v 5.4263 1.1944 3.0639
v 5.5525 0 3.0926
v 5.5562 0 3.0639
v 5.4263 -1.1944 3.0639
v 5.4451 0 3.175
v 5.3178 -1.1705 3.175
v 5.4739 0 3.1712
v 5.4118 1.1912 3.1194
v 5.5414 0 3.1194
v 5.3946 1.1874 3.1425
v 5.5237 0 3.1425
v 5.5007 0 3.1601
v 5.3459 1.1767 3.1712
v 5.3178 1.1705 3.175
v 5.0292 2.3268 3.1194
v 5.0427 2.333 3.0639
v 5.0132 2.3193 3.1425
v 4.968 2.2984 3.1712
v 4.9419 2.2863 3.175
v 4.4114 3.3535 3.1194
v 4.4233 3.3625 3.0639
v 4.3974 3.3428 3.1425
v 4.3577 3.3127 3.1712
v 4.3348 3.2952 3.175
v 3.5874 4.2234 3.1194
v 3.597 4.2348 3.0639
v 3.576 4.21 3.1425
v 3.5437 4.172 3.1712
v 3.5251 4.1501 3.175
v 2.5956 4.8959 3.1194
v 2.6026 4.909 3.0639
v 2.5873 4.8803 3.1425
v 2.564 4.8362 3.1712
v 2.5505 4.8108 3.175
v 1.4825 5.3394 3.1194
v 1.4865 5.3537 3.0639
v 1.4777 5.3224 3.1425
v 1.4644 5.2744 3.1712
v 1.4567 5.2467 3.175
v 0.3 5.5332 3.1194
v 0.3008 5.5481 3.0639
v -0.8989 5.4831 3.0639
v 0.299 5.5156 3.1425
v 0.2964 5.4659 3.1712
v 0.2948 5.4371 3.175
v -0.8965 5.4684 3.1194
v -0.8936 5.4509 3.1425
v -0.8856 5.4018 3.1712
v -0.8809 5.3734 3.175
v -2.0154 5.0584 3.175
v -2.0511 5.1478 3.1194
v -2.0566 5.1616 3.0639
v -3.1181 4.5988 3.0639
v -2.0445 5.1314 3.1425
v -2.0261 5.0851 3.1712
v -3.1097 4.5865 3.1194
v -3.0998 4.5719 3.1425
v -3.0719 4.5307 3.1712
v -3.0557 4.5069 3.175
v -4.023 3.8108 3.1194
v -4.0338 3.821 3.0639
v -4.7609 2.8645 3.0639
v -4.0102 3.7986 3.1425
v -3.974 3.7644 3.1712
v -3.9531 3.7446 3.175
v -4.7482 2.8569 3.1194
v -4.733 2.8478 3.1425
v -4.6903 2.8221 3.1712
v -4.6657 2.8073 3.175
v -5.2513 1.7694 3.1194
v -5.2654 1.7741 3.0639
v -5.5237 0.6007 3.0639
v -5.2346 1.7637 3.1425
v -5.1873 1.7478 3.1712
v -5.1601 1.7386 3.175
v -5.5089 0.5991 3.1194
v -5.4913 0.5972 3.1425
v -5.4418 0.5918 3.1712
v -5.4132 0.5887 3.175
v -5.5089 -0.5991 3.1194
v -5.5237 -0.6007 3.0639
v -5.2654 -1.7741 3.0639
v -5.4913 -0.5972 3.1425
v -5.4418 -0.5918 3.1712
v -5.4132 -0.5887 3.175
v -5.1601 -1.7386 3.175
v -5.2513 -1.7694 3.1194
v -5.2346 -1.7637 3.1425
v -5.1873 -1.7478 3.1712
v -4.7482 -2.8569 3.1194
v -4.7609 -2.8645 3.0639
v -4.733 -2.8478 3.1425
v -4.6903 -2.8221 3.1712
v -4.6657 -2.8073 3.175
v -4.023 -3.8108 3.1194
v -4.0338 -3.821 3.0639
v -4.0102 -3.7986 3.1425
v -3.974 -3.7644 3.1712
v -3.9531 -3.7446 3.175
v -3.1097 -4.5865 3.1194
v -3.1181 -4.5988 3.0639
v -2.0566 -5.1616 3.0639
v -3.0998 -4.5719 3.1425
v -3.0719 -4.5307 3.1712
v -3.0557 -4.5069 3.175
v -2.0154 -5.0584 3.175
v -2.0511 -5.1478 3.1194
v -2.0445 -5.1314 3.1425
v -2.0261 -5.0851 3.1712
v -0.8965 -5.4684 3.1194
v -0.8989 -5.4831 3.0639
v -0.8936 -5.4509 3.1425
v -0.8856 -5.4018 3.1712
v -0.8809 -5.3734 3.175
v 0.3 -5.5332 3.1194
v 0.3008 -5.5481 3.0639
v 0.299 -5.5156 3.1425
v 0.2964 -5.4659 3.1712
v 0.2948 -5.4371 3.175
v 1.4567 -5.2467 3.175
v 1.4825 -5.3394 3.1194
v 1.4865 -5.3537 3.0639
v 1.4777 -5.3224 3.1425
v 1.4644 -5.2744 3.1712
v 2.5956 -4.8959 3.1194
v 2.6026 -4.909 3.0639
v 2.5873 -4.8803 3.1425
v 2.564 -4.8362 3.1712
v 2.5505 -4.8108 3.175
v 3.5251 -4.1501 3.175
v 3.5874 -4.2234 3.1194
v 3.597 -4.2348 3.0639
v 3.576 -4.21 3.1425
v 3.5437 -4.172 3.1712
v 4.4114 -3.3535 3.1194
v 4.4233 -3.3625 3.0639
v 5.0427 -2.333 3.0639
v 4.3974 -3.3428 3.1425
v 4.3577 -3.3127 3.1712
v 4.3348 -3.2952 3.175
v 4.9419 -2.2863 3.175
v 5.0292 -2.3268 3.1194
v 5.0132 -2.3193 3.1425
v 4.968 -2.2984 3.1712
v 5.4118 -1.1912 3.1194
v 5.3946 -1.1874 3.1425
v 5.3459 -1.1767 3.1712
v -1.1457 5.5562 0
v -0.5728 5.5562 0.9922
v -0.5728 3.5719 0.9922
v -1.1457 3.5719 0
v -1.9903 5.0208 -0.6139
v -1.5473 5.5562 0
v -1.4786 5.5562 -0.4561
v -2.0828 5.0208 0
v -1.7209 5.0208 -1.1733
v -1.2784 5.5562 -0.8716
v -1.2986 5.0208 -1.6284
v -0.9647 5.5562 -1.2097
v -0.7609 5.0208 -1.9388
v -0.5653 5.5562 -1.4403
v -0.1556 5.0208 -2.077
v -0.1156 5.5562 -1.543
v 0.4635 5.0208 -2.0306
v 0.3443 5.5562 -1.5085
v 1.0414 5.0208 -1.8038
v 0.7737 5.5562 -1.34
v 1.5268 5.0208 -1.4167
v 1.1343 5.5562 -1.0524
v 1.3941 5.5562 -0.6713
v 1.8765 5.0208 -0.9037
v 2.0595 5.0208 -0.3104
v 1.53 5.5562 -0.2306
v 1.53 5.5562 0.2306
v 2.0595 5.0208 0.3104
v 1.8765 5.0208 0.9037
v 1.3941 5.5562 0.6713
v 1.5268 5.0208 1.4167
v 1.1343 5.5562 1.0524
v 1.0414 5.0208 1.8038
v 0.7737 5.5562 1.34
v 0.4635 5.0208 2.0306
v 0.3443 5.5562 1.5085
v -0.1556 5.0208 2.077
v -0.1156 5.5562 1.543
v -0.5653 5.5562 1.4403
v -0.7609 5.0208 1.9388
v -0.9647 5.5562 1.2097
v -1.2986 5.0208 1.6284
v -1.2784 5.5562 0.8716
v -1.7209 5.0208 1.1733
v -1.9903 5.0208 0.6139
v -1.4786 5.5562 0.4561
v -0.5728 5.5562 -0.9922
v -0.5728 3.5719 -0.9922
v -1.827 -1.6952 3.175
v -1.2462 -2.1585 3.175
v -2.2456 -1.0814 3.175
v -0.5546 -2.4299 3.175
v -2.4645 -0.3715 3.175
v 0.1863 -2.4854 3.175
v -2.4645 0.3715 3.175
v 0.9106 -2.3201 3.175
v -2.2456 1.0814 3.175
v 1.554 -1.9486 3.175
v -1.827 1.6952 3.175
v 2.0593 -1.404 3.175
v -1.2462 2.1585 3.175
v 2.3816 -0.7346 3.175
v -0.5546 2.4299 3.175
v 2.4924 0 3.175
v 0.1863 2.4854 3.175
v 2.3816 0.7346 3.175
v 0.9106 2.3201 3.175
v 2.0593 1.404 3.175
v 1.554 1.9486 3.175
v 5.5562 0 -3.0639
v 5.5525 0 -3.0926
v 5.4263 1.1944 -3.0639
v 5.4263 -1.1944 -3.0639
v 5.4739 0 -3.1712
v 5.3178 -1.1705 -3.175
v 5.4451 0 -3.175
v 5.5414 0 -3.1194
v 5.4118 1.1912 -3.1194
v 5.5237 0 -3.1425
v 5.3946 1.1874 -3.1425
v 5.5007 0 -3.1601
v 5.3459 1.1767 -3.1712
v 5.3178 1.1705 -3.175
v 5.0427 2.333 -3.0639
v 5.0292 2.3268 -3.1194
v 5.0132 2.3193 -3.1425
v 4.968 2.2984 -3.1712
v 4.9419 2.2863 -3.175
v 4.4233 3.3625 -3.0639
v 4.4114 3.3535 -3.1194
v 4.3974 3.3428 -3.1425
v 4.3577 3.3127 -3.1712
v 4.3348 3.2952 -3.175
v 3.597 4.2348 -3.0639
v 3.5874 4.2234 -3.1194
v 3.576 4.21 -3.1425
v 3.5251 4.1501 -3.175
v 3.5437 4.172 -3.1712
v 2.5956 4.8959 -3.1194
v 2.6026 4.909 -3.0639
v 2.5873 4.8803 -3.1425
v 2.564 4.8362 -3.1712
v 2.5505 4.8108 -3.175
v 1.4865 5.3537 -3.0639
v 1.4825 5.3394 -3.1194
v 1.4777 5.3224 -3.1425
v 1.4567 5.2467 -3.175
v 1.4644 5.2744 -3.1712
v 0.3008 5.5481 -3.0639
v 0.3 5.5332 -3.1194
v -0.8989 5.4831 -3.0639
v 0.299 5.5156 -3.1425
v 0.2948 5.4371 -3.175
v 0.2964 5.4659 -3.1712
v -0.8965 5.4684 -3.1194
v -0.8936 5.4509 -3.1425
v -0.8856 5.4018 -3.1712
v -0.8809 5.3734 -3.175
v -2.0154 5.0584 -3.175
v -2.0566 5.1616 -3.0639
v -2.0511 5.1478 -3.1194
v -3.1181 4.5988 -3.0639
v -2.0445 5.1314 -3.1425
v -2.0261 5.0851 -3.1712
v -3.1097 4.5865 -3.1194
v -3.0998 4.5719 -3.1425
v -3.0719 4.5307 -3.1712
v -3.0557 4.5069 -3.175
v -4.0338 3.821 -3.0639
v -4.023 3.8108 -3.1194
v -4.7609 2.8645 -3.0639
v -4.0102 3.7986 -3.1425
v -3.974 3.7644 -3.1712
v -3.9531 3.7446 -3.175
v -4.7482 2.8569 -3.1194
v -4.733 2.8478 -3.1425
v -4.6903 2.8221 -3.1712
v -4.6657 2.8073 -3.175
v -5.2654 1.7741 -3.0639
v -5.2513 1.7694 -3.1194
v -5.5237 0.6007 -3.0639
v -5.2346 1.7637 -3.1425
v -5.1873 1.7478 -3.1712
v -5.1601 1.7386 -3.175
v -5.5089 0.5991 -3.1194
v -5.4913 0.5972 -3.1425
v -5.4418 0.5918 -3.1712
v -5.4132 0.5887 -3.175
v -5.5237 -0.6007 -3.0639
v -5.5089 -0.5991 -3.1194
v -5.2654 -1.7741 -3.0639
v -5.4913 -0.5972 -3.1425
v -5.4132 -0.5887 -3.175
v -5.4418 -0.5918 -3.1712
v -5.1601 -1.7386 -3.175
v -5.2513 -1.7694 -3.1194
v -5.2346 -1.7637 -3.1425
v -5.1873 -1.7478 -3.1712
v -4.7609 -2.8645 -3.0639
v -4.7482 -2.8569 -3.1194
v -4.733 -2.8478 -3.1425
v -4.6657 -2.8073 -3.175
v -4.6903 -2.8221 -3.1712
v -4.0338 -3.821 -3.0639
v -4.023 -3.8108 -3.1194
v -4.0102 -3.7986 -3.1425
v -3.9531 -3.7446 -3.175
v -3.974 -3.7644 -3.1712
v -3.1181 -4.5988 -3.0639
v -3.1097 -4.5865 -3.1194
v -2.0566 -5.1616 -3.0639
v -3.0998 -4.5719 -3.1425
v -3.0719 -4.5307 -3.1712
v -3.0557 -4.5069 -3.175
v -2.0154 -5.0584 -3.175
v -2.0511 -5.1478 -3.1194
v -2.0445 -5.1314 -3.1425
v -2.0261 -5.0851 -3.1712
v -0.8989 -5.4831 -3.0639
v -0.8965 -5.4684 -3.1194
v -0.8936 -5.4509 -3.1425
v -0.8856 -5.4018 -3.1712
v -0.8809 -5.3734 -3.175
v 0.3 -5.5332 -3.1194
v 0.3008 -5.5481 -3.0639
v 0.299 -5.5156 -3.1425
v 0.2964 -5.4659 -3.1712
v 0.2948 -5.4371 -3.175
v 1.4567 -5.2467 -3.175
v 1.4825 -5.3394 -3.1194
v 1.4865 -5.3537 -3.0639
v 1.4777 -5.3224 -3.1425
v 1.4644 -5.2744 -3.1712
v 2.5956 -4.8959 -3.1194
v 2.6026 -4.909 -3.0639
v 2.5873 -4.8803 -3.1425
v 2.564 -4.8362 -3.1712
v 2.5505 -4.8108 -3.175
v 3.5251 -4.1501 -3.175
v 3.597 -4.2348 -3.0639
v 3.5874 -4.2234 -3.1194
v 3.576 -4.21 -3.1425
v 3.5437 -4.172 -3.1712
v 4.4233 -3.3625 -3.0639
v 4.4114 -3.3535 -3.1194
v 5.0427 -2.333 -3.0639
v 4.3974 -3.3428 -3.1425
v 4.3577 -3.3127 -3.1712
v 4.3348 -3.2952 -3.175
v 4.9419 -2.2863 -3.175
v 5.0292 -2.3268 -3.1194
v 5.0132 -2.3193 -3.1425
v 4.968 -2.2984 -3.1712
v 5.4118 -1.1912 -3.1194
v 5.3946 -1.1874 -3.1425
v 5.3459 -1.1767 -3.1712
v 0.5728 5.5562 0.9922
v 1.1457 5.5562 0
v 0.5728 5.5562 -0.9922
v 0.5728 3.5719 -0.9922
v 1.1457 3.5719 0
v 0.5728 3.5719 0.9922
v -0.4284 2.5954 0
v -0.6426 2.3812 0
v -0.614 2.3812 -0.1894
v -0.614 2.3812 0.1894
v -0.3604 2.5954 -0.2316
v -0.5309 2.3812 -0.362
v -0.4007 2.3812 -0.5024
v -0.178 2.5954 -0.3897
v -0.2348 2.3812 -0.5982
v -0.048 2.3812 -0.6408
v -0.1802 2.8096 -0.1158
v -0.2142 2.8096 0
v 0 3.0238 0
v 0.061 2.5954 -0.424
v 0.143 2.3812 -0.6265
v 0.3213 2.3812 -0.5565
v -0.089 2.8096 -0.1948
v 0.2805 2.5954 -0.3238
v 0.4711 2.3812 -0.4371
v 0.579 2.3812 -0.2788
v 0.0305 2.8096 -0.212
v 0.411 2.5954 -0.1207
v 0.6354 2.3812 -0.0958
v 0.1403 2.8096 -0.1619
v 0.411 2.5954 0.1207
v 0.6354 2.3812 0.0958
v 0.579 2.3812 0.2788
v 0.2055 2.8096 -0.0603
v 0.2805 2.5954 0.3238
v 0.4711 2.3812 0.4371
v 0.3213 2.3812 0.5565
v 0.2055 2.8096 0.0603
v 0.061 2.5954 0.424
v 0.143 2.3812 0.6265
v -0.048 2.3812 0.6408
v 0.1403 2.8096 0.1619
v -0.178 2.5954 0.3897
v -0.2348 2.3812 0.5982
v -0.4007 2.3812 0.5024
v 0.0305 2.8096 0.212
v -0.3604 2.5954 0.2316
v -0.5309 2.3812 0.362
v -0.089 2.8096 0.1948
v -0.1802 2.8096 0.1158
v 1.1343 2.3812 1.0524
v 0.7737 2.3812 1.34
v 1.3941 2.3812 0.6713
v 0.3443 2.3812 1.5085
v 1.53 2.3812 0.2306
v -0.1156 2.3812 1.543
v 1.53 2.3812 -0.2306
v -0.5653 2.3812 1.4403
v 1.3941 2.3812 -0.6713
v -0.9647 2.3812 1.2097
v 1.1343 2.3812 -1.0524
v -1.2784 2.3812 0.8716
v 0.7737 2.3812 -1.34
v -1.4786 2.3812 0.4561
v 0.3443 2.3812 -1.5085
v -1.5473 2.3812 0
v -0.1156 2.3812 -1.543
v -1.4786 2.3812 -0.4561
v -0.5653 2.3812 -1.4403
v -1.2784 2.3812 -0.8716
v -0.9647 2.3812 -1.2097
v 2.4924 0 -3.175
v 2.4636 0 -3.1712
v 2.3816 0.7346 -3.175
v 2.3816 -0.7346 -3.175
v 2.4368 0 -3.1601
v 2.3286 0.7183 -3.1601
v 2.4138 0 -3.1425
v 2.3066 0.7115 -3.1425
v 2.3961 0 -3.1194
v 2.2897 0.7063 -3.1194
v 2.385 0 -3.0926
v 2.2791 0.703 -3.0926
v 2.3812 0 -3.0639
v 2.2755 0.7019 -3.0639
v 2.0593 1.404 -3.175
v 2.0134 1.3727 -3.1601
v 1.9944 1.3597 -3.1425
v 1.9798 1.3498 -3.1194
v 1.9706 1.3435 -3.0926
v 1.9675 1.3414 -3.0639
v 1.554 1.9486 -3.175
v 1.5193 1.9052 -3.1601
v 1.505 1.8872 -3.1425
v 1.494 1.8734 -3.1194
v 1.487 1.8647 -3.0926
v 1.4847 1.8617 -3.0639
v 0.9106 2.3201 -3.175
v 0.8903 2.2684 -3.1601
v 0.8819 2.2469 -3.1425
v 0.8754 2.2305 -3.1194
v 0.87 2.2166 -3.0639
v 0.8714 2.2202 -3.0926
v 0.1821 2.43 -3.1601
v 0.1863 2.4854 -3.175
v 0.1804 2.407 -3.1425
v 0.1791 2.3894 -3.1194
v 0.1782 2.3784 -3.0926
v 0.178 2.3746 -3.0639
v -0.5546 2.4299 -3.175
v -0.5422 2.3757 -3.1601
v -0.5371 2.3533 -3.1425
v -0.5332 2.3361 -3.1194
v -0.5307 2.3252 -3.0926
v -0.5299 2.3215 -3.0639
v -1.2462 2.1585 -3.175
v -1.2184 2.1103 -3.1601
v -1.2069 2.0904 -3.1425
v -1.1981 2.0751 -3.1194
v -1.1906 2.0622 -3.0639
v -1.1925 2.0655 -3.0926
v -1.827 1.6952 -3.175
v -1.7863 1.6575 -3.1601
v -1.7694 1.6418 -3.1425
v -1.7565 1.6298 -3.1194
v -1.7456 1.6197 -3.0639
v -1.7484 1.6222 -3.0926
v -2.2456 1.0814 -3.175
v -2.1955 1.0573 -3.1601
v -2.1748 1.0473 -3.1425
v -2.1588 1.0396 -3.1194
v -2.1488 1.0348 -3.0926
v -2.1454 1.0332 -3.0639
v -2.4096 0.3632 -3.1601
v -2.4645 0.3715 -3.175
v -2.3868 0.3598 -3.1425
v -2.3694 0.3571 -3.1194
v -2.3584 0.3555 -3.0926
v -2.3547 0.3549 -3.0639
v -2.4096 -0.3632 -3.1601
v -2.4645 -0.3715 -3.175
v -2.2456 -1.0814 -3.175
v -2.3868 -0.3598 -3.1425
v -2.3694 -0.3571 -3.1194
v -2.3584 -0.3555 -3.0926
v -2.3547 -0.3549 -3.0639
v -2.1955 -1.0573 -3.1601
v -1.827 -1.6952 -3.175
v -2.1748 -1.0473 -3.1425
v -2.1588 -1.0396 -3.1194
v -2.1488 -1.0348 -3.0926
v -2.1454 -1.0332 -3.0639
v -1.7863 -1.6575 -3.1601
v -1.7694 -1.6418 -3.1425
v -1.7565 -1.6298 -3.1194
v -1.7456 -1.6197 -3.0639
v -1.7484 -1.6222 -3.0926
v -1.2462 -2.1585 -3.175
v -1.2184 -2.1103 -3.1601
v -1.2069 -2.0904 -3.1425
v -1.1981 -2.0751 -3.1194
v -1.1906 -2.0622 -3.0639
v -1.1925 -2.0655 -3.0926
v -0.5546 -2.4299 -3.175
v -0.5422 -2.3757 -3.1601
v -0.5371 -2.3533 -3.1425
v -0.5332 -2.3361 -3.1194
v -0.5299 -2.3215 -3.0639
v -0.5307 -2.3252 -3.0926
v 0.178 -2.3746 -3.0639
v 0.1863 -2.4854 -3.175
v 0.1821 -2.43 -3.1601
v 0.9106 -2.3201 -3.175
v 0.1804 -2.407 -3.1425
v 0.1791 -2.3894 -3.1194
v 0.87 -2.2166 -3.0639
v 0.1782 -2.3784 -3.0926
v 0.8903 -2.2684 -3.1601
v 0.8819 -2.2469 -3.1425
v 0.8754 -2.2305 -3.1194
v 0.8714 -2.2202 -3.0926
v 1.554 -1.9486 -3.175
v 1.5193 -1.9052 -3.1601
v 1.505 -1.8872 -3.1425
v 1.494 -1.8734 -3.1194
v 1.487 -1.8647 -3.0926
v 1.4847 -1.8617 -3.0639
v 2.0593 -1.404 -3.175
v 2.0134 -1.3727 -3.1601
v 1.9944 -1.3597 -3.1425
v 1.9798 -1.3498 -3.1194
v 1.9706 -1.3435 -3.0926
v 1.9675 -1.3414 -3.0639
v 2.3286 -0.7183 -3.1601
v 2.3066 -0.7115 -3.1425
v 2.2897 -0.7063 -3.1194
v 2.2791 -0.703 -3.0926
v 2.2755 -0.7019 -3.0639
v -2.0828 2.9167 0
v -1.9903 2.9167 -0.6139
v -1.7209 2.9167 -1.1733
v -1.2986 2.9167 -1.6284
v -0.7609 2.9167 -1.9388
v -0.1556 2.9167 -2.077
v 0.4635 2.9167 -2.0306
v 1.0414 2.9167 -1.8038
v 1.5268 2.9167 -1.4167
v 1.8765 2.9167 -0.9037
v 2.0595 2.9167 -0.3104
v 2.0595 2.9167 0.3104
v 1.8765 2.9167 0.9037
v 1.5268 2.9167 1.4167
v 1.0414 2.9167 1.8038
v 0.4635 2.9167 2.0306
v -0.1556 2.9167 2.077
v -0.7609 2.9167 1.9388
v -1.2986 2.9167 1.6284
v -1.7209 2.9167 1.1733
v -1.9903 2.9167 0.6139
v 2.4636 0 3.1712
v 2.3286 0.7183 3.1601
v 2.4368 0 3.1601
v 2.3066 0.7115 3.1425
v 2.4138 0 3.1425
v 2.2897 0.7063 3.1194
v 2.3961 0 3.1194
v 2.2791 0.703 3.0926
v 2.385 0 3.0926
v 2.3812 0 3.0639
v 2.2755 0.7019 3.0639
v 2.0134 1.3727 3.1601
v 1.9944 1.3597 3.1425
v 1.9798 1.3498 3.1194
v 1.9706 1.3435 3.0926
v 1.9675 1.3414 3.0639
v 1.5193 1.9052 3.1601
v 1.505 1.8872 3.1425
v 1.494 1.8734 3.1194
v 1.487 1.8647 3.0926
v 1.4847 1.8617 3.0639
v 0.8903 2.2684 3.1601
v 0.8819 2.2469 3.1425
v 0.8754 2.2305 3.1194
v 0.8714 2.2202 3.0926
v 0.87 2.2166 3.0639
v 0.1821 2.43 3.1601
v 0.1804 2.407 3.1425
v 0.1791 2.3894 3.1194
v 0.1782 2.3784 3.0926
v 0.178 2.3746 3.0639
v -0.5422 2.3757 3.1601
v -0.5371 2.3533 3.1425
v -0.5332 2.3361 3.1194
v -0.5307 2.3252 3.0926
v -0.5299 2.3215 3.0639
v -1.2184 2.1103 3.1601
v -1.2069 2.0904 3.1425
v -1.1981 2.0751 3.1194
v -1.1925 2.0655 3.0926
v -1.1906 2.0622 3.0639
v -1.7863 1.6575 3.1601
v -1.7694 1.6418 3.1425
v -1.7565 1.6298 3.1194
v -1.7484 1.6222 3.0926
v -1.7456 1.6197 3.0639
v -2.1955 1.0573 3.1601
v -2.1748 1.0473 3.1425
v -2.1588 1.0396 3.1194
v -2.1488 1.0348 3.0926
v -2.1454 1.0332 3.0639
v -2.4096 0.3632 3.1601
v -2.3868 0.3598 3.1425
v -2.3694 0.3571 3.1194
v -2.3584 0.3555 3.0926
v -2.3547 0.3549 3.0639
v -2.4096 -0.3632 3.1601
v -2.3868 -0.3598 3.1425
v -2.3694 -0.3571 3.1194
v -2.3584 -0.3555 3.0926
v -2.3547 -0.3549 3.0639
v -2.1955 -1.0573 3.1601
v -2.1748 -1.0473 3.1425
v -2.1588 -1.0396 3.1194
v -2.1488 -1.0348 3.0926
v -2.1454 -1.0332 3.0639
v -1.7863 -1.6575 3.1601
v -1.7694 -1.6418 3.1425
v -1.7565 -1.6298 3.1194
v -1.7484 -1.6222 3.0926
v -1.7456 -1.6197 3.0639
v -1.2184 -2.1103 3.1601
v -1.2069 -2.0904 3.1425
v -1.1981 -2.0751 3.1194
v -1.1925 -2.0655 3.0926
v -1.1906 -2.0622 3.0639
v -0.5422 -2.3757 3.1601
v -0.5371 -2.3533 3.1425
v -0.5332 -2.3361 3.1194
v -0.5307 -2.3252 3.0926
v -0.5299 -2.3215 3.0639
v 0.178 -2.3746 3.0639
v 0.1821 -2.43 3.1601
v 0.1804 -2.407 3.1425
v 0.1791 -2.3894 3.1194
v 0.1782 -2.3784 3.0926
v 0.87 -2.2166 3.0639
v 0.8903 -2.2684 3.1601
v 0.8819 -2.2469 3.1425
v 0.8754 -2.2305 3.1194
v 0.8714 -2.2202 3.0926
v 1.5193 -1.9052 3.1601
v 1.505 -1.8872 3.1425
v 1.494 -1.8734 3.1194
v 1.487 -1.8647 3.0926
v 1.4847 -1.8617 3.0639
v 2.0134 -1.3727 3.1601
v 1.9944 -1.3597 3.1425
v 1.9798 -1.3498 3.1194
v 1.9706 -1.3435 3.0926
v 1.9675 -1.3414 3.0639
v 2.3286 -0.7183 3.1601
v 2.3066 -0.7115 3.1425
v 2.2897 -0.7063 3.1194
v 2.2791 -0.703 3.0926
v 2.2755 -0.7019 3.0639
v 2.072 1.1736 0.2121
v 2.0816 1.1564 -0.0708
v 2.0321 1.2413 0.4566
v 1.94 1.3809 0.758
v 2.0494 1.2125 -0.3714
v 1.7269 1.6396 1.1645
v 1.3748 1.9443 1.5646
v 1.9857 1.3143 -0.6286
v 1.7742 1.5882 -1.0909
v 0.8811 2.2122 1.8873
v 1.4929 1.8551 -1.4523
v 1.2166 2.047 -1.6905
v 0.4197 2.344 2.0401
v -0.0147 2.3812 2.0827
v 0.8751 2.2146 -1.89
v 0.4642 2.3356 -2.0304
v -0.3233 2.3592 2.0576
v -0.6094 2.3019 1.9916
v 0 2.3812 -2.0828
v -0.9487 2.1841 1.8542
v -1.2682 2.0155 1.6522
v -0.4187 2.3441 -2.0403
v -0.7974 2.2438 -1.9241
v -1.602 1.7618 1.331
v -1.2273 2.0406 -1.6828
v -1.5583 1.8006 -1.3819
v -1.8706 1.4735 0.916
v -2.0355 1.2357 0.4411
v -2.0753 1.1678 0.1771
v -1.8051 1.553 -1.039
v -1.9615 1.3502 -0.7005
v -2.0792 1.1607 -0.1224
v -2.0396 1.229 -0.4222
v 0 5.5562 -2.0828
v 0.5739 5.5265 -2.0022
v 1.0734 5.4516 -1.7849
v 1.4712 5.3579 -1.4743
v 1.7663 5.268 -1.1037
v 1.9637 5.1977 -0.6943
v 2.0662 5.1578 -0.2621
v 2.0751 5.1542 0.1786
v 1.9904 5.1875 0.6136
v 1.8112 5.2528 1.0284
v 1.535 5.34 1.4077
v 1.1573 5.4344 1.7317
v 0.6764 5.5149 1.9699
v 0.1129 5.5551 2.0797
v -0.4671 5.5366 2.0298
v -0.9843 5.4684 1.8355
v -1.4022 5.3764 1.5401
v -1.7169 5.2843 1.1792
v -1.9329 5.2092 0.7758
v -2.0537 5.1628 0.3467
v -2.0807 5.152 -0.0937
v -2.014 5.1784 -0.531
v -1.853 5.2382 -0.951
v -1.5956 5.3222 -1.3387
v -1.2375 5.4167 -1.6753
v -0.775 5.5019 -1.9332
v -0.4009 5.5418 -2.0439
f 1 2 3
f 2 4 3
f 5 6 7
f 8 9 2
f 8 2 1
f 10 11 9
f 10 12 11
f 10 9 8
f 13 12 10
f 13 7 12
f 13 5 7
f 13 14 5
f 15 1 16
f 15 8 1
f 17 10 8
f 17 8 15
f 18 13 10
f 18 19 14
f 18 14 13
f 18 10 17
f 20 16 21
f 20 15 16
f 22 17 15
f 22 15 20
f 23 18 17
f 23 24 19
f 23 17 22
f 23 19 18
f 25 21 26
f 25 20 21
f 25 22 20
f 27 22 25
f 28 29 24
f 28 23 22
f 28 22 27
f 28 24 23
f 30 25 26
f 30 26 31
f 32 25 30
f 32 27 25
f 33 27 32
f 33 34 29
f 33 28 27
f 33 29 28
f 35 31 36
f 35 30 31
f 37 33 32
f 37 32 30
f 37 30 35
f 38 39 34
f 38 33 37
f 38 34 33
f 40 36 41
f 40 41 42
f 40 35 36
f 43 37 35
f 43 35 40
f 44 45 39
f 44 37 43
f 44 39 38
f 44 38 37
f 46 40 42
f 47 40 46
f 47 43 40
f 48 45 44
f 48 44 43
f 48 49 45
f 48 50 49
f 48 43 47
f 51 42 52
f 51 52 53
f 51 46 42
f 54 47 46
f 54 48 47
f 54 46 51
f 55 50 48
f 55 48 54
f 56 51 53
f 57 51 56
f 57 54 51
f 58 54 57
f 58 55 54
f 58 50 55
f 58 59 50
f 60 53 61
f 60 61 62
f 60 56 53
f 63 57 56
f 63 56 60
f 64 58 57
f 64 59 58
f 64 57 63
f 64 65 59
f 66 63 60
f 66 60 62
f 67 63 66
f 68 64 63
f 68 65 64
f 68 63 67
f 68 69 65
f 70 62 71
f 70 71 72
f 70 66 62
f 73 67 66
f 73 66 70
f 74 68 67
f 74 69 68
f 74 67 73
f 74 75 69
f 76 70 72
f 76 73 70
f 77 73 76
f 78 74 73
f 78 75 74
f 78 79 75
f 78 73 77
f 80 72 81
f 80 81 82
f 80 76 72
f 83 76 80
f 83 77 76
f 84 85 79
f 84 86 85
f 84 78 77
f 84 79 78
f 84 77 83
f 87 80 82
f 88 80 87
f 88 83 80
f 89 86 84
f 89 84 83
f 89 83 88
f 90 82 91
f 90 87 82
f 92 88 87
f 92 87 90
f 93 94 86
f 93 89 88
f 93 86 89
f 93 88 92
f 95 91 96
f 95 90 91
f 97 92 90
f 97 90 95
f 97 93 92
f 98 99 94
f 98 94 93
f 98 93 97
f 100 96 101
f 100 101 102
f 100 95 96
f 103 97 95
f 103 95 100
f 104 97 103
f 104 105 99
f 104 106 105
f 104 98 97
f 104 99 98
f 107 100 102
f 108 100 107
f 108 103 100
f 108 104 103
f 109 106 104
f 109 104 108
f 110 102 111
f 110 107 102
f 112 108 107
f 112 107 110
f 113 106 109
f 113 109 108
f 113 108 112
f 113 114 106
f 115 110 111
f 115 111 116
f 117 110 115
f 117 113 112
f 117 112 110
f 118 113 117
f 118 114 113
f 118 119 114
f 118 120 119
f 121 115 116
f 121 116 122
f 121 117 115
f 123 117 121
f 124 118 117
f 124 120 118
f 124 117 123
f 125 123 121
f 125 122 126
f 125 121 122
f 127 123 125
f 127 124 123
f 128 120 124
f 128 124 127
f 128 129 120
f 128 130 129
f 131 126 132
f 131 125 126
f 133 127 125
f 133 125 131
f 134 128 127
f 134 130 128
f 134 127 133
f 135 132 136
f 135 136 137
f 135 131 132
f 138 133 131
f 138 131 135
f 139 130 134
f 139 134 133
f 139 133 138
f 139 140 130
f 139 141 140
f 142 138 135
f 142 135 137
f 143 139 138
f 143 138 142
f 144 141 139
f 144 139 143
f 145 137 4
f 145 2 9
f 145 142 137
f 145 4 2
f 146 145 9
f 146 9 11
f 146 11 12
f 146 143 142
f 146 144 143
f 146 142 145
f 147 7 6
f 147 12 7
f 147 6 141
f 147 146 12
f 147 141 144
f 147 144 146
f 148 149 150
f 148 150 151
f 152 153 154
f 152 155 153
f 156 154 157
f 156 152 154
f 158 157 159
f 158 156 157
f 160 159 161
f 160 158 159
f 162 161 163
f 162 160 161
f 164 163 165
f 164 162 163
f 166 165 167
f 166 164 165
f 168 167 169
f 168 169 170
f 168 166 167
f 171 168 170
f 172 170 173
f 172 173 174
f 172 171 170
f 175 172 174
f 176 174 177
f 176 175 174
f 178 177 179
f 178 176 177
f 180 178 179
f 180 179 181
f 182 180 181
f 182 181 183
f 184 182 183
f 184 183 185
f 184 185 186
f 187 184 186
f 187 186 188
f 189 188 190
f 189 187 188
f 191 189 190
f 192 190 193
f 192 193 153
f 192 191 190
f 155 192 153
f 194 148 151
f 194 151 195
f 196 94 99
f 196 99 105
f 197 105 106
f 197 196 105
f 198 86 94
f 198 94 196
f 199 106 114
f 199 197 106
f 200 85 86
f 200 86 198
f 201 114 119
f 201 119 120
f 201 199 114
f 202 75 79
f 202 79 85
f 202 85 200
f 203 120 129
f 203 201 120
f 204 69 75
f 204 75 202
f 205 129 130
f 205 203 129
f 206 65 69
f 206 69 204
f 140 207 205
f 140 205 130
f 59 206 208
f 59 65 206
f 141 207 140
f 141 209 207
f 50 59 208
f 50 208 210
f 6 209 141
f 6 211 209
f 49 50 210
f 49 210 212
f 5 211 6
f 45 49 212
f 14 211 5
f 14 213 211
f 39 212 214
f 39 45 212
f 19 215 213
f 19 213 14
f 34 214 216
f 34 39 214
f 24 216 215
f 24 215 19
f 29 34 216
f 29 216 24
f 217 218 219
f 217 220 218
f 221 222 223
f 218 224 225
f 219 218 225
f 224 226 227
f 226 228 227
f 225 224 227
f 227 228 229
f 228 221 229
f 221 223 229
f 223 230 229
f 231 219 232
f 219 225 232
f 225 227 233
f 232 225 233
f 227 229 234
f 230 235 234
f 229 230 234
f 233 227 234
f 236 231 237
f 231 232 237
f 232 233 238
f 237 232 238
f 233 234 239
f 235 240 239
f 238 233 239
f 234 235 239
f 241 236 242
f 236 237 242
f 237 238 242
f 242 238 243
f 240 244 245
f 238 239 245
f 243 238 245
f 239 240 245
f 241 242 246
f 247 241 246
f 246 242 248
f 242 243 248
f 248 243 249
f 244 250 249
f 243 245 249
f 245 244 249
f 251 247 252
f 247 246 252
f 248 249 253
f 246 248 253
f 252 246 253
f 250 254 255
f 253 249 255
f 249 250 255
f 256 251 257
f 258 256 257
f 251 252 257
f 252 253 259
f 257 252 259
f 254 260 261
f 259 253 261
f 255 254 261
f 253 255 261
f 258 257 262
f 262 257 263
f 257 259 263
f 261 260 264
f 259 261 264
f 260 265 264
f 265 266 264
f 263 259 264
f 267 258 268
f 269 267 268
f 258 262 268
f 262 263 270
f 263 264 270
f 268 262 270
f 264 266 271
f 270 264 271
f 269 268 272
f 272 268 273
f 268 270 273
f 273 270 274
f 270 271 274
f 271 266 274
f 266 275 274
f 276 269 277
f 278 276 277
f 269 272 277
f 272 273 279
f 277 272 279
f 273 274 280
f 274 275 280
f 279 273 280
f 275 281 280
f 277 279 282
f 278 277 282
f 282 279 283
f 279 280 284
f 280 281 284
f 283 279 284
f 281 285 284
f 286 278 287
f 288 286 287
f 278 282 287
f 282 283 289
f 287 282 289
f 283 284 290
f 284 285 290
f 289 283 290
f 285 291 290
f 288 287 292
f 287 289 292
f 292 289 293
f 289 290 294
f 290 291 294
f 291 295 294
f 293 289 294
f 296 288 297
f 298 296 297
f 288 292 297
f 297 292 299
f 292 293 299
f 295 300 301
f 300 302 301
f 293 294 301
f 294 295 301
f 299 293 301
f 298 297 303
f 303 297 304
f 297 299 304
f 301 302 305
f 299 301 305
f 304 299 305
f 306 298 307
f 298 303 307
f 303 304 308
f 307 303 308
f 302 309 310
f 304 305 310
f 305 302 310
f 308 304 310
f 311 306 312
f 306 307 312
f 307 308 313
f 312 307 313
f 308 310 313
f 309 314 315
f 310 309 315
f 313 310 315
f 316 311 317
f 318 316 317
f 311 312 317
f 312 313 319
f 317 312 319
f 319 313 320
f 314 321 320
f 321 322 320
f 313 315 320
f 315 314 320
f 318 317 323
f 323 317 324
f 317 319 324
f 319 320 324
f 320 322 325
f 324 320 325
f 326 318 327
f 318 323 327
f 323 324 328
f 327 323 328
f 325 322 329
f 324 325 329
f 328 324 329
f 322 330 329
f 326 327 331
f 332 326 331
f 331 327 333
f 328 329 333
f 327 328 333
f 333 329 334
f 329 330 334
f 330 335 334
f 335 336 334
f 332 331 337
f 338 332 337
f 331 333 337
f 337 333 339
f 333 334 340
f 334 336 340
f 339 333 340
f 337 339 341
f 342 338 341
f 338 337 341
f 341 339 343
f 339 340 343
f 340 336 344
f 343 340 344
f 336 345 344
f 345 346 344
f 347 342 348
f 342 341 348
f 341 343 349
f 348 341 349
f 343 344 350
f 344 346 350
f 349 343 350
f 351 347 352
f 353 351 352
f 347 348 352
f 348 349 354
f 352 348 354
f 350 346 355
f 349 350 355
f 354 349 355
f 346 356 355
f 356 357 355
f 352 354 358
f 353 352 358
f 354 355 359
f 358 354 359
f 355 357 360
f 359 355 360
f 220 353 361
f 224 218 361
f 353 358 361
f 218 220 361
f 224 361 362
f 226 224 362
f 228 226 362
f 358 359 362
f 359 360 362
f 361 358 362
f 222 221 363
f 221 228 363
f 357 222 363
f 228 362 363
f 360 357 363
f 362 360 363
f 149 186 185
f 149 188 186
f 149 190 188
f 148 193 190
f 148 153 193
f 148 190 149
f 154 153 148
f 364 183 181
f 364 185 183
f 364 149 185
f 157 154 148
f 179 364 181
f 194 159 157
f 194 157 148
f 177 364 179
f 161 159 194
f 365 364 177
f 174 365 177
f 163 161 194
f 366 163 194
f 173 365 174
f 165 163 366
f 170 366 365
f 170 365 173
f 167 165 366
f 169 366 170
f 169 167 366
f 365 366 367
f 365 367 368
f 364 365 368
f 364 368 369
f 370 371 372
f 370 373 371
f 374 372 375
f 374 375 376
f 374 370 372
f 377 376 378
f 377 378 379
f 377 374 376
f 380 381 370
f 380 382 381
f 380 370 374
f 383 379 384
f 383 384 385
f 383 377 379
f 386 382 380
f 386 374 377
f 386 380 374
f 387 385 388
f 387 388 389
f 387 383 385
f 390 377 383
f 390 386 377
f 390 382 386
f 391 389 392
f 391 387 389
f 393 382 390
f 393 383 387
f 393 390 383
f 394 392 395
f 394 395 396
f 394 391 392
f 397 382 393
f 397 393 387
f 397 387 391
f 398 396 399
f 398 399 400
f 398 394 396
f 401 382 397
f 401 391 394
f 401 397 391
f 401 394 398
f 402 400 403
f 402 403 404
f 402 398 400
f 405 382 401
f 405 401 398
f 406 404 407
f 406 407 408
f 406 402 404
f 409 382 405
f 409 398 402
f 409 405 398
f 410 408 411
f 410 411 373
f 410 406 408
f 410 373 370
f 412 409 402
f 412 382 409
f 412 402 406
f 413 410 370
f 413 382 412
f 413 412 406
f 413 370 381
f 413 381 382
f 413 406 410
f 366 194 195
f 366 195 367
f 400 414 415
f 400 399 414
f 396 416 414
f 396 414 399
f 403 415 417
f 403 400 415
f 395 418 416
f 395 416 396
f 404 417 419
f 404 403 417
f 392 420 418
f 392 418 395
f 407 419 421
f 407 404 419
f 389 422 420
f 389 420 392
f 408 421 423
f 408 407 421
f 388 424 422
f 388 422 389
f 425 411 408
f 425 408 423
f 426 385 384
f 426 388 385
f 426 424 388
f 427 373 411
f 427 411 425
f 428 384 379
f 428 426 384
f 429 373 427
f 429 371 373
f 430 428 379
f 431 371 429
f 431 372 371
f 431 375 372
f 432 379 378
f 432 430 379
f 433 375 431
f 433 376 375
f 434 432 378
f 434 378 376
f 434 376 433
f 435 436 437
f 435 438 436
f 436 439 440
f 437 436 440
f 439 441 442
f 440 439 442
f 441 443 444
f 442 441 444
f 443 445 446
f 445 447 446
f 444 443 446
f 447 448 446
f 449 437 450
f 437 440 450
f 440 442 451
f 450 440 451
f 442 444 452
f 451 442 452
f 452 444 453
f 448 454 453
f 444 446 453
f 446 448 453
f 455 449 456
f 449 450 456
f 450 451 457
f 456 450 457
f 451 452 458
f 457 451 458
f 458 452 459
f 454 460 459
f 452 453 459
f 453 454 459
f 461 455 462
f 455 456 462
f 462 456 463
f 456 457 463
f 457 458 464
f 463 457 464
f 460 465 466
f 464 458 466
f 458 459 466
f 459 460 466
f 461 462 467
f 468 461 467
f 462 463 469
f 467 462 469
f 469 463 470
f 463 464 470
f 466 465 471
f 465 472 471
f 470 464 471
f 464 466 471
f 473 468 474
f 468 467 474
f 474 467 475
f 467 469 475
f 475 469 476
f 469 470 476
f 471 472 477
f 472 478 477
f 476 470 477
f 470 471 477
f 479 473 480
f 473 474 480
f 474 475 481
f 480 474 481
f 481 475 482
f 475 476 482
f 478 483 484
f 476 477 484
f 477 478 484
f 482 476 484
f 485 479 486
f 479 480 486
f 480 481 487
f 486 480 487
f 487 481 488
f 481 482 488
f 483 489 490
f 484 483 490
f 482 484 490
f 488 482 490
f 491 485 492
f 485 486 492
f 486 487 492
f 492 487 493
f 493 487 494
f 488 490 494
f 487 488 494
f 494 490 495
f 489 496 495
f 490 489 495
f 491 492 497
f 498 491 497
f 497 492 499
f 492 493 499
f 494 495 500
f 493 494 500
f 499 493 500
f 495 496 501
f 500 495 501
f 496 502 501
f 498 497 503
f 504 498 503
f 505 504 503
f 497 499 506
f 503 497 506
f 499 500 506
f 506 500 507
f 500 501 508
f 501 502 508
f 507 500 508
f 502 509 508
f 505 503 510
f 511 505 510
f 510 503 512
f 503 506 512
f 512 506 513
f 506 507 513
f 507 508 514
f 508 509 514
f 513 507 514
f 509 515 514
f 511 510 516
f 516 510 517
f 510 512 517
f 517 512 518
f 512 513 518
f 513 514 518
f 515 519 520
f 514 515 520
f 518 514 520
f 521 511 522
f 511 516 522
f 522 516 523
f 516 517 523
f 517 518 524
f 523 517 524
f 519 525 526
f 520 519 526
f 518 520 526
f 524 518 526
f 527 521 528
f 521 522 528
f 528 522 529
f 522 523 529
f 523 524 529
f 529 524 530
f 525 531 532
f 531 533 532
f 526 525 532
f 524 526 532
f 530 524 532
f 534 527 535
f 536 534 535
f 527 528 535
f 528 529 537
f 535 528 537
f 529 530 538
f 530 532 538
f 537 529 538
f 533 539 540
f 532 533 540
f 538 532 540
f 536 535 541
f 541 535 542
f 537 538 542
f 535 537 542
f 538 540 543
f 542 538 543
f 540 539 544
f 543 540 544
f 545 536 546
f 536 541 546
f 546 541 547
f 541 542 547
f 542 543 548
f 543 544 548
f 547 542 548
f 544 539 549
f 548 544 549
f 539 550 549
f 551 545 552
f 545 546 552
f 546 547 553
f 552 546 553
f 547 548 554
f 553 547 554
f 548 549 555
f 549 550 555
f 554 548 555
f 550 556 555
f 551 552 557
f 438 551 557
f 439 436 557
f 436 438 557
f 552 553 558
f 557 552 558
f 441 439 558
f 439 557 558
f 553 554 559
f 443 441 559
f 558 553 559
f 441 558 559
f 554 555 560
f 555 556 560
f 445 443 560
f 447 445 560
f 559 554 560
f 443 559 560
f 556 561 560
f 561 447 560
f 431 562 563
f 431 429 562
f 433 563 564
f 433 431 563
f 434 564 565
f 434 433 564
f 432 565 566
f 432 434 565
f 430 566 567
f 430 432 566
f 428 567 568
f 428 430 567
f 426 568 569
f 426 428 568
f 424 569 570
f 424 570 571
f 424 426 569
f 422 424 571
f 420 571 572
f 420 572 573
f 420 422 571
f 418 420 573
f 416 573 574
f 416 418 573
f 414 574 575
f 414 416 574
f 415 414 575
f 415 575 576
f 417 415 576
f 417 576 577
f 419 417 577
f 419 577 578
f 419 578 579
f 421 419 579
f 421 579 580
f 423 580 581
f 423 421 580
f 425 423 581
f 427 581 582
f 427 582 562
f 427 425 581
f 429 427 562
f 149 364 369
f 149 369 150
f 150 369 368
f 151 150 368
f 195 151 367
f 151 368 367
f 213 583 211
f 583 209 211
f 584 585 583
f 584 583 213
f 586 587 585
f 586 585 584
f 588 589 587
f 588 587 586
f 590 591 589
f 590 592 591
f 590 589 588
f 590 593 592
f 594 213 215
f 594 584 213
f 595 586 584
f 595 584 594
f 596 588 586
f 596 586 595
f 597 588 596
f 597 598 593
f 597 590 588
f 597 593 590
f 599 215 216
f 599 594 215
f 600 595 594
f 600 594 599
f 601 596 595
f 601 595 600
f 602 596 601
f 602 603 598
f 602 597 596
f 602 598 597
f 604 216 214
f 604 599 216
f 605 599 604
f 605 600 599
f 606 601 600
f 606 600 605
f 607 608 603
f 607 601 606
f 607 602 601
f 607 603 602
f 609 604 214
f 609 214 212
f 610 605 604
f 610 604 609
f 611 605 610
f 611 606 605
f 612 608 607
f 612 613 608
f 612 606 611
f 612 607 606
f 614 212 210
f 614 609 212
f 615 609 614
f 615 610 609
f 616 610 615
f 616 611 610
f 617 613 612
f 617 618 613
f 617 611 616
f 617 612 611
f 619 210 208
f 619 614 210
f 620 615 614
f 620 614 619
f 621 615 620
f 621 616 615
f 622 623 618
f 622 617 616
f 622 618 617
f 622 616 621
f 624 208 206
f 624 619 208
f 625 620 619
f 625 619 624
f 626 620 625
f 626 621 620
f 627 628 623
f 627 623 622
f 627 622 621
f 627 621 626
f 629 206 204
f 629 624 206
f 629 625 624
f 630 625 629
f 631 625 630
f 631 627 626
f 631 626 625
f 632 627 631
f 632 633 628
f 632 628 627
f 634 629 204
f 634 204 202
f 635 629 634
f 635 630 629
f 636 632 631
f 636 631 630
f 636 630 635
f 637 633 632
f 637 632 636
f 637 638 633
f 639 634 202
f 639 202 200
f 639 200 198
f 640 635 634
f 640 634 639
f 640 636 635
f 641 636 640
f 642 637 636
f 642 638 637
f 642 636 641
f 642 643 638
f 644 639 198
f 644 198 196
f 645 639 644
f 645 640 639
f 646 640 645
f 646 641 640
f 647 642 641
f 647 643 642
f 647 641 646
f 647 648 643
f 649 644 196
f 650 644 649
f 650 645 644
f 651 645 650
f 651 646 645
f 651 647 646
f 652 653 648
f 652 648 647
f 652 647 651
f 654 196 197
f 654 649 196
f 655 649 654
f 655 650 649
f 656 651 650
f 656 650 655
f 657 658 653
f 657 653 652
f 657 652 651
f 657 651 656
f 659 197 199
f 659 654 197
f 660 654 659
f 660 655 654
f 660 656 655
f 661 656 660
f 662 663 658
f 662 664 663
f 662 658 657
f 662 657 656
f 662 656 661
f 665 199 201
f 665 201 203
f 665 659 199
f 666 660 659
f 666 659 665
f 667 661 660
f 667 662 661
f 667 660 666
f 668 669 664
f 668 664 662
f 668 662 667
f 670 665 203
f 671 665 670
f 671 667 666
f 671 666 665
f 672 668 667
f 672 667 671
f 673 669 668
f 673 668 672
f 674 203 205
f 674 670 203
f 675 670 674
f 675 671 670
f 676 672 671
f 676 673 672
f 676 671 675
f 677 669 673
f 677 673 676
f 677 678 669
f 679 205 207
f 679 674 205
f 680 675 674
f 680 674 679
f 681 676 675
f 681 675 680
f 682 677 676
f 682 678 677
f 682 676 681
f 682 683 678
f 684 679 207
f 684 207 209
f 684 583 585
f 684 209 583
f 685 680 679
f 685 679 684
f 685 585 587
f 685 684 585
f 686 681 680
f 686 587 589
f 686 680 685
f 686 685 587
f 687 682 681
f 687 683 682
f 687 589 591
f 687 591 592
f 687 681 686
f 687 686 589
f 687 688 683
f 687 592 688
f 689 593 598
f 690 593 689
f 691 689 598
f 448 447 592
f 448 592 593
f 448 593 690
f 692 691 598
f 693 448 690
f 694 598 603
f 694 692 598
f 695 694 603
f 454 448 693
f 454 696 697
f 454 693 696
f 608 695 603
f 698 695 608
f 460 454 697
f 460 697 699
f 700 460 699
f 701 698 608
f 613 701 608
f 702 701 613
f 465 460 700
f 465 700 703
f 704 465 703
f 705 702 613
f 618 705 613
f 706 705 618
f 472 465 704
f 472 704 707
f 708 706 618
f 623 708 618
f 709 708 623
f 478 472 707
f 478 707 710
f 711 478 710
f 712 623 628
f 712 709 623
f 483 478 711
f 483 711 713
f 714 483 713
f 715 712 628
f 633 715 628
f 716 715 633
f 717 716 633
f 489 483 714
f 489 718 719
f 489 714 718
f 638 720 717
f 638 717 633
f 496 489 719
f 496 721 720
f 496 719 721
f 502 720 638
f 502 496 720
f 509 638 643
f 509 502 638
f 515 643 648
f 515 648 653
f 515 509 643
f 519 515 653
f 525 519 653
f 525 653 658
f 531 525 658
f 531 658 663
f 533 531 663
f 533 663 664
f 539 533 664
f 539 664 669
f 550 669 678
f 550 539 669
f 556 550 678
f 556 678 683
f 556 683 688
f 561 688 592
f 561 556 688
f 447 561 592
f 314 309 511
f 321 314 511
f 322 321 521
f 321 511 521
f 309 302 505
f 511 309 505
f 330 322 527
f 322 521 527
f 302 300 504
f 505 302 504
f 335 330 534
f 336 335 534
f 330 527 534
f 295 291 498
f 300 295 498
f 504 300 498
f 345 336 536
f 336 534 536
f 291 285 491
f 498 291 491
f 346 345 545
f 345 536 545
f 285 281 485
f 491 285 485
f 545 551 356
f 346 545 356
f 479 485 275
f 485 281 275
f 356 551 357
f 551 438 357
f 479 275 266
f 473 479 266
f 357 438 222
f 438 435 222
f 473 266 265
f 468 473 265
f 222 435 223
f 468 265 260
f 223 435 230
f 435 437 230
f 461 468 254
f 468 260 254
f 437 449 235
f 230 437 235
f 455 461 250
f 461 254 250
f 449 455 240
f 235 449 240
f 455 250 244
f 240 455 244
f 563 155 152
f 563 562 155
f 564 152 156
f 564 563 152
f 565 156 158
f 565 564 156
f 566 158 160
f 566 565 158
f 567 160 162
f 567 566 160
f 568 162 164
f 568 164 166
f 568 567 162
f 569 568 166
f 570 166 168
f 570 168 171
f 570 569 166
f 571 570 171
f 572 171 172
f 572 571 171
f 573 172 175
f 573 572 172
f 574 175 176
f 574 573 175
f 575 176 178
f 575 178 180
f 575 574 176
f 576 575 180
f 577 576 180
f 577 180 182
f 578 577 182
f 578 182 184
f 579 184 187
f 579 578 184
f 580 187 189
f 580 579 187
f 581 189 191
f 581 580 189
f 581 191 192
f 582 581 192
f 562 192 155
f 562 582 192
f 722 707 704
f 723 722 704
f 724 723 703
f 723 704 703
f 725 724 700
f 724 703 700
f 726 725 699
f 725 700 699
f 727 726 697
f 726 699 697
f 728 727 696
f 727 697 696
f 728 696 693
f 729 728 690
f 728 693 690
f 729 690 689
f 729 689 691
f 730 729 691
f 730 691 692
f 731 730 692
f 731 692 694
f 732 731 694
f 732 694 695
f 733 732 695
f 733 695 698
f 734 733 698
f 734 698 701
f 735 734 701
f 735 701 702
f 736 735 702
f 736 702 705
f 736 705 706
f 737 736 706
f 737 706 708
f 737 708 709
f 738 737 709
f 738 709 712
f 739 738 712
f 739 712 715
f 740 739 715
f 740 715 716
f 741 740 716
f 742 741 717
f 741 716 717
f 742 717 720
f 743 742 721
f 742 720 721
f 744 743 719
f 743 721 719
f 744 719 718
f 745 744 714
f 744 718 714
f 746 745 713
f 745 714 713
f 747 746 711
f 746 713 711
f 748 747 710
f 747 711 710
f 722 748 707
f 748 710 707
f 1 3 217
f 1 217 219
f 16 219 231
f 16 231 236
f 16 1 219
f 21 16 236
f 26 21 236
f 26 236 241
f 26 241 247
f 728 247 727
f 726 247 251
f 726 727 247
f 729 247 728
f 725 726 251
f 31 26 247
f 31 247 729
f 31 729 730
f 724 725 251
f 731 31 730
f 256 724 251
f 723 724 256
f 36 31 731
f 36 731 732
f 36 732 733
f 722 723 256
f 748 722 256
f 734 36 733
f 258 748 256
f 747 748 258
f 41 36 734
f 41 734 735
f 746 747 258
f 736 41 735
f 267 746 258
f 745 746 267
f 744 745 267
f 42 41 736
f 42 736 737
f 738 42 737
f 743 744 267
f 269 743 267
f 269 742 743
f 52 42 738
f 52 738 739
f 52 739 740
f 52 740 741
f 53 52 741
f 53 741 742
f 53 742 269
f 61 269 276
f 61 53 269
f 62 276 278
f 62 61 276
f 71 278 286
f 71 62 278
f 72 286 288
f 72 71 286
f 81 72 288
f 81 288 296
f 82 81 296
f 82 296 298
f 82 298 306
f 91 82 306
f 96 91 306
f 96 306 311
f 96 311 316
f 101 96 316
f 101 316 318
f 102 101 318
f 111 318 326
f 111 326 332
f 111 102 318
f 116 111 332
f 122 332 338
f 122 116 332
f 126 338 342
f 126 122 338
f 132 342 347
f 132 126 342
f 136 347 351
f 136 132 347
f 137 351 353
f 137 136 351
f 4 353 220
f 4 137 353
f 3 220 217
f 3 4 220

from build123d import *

# Parameters (mm, degrees)
SKETCH1_R          = 5.55625
SKETCH1_R_2        = 2.38125
EXTRUDE1_DEPTH     = 3.175
SKETCH2_R          = 2.0828
CUT_EXTRUDE1_DEPTH = 48.266462906
FILLET1_R          = 0.111125
CUT_EXTRUDE2_DEPTH = 1.984375


with BuildPart() as part:
    # Sketch1 → Extrude1 (new, symmetric)
    with BuildSketch(Plane.XY):
        Circle(SKETCH1_R)
        Circle(SKETCH1_R_2, mode=Mode.SUBTRACT)
    extrude(amount=EXTRUDE1_DEPTH, both=True)

    # Sketch2 → Cut-Extrude1 (cut, through all)
    with BuildSketch(Plane(origin=(41.275, 0, 0), x_dir=(0, 0, -1), z_dir=(0, -1, 0))):
        with Locations((0, -41.275)):
            Circle(SKETCH2_R)
    extrude(amount=-CUT_EXTRUDE1_DEPTH, mode=Mode.SUBTRACT)

    # Fillet1
    fillet1_edges = [part.edges().sort_by_distance(p)[0] for p in [
        (-5.55625, 0, -3.175),
        (-5.55625, 0, 3.175),
        (-2.38125, 0, -3.175),
        (-2.38125, 0, 3.175),
    ]]
    fillet(fillet1_edges, radius=FILLET1_R)


with BuildPart() as body_2:
    # Sketch3 → Revolve1 (revolve)
    with BuildSketch(Plane.XY):
        Polygon((-1.547302537, 2.38125), (-0.642596955, 2.38125), (0, 3.023846955), (0, 5.55625), (-1.547302537, 5.55625), (-2.0828, 5.020752537), (-2.0828, 2.916747463), align=None)
    revolve(axis=Axis((0, 2.38125, 0), (0, -1, 0)))

    # Sketch4 → Cut-Extrude2 (cut)
    with BuildSketch(Plane(origin=(3.3734375, 5.55625, 0), x_dir=(0, 0, -1), z_dir=(0, -1, 0))):
        Polygon((0, -2.22775806), (-0.9921875, -2.80059778), (-0.9921875, -3.94627722), (0, -4.51911694), (0.9921875, -3.94627722), (0.9921875, -2.80059778), align=None)
    extrude(amount=CUT_EXTRUDE2_DEPTH, mode=Mode.SUBTRACT)


solid = Compound([part.part, body_2.part])
